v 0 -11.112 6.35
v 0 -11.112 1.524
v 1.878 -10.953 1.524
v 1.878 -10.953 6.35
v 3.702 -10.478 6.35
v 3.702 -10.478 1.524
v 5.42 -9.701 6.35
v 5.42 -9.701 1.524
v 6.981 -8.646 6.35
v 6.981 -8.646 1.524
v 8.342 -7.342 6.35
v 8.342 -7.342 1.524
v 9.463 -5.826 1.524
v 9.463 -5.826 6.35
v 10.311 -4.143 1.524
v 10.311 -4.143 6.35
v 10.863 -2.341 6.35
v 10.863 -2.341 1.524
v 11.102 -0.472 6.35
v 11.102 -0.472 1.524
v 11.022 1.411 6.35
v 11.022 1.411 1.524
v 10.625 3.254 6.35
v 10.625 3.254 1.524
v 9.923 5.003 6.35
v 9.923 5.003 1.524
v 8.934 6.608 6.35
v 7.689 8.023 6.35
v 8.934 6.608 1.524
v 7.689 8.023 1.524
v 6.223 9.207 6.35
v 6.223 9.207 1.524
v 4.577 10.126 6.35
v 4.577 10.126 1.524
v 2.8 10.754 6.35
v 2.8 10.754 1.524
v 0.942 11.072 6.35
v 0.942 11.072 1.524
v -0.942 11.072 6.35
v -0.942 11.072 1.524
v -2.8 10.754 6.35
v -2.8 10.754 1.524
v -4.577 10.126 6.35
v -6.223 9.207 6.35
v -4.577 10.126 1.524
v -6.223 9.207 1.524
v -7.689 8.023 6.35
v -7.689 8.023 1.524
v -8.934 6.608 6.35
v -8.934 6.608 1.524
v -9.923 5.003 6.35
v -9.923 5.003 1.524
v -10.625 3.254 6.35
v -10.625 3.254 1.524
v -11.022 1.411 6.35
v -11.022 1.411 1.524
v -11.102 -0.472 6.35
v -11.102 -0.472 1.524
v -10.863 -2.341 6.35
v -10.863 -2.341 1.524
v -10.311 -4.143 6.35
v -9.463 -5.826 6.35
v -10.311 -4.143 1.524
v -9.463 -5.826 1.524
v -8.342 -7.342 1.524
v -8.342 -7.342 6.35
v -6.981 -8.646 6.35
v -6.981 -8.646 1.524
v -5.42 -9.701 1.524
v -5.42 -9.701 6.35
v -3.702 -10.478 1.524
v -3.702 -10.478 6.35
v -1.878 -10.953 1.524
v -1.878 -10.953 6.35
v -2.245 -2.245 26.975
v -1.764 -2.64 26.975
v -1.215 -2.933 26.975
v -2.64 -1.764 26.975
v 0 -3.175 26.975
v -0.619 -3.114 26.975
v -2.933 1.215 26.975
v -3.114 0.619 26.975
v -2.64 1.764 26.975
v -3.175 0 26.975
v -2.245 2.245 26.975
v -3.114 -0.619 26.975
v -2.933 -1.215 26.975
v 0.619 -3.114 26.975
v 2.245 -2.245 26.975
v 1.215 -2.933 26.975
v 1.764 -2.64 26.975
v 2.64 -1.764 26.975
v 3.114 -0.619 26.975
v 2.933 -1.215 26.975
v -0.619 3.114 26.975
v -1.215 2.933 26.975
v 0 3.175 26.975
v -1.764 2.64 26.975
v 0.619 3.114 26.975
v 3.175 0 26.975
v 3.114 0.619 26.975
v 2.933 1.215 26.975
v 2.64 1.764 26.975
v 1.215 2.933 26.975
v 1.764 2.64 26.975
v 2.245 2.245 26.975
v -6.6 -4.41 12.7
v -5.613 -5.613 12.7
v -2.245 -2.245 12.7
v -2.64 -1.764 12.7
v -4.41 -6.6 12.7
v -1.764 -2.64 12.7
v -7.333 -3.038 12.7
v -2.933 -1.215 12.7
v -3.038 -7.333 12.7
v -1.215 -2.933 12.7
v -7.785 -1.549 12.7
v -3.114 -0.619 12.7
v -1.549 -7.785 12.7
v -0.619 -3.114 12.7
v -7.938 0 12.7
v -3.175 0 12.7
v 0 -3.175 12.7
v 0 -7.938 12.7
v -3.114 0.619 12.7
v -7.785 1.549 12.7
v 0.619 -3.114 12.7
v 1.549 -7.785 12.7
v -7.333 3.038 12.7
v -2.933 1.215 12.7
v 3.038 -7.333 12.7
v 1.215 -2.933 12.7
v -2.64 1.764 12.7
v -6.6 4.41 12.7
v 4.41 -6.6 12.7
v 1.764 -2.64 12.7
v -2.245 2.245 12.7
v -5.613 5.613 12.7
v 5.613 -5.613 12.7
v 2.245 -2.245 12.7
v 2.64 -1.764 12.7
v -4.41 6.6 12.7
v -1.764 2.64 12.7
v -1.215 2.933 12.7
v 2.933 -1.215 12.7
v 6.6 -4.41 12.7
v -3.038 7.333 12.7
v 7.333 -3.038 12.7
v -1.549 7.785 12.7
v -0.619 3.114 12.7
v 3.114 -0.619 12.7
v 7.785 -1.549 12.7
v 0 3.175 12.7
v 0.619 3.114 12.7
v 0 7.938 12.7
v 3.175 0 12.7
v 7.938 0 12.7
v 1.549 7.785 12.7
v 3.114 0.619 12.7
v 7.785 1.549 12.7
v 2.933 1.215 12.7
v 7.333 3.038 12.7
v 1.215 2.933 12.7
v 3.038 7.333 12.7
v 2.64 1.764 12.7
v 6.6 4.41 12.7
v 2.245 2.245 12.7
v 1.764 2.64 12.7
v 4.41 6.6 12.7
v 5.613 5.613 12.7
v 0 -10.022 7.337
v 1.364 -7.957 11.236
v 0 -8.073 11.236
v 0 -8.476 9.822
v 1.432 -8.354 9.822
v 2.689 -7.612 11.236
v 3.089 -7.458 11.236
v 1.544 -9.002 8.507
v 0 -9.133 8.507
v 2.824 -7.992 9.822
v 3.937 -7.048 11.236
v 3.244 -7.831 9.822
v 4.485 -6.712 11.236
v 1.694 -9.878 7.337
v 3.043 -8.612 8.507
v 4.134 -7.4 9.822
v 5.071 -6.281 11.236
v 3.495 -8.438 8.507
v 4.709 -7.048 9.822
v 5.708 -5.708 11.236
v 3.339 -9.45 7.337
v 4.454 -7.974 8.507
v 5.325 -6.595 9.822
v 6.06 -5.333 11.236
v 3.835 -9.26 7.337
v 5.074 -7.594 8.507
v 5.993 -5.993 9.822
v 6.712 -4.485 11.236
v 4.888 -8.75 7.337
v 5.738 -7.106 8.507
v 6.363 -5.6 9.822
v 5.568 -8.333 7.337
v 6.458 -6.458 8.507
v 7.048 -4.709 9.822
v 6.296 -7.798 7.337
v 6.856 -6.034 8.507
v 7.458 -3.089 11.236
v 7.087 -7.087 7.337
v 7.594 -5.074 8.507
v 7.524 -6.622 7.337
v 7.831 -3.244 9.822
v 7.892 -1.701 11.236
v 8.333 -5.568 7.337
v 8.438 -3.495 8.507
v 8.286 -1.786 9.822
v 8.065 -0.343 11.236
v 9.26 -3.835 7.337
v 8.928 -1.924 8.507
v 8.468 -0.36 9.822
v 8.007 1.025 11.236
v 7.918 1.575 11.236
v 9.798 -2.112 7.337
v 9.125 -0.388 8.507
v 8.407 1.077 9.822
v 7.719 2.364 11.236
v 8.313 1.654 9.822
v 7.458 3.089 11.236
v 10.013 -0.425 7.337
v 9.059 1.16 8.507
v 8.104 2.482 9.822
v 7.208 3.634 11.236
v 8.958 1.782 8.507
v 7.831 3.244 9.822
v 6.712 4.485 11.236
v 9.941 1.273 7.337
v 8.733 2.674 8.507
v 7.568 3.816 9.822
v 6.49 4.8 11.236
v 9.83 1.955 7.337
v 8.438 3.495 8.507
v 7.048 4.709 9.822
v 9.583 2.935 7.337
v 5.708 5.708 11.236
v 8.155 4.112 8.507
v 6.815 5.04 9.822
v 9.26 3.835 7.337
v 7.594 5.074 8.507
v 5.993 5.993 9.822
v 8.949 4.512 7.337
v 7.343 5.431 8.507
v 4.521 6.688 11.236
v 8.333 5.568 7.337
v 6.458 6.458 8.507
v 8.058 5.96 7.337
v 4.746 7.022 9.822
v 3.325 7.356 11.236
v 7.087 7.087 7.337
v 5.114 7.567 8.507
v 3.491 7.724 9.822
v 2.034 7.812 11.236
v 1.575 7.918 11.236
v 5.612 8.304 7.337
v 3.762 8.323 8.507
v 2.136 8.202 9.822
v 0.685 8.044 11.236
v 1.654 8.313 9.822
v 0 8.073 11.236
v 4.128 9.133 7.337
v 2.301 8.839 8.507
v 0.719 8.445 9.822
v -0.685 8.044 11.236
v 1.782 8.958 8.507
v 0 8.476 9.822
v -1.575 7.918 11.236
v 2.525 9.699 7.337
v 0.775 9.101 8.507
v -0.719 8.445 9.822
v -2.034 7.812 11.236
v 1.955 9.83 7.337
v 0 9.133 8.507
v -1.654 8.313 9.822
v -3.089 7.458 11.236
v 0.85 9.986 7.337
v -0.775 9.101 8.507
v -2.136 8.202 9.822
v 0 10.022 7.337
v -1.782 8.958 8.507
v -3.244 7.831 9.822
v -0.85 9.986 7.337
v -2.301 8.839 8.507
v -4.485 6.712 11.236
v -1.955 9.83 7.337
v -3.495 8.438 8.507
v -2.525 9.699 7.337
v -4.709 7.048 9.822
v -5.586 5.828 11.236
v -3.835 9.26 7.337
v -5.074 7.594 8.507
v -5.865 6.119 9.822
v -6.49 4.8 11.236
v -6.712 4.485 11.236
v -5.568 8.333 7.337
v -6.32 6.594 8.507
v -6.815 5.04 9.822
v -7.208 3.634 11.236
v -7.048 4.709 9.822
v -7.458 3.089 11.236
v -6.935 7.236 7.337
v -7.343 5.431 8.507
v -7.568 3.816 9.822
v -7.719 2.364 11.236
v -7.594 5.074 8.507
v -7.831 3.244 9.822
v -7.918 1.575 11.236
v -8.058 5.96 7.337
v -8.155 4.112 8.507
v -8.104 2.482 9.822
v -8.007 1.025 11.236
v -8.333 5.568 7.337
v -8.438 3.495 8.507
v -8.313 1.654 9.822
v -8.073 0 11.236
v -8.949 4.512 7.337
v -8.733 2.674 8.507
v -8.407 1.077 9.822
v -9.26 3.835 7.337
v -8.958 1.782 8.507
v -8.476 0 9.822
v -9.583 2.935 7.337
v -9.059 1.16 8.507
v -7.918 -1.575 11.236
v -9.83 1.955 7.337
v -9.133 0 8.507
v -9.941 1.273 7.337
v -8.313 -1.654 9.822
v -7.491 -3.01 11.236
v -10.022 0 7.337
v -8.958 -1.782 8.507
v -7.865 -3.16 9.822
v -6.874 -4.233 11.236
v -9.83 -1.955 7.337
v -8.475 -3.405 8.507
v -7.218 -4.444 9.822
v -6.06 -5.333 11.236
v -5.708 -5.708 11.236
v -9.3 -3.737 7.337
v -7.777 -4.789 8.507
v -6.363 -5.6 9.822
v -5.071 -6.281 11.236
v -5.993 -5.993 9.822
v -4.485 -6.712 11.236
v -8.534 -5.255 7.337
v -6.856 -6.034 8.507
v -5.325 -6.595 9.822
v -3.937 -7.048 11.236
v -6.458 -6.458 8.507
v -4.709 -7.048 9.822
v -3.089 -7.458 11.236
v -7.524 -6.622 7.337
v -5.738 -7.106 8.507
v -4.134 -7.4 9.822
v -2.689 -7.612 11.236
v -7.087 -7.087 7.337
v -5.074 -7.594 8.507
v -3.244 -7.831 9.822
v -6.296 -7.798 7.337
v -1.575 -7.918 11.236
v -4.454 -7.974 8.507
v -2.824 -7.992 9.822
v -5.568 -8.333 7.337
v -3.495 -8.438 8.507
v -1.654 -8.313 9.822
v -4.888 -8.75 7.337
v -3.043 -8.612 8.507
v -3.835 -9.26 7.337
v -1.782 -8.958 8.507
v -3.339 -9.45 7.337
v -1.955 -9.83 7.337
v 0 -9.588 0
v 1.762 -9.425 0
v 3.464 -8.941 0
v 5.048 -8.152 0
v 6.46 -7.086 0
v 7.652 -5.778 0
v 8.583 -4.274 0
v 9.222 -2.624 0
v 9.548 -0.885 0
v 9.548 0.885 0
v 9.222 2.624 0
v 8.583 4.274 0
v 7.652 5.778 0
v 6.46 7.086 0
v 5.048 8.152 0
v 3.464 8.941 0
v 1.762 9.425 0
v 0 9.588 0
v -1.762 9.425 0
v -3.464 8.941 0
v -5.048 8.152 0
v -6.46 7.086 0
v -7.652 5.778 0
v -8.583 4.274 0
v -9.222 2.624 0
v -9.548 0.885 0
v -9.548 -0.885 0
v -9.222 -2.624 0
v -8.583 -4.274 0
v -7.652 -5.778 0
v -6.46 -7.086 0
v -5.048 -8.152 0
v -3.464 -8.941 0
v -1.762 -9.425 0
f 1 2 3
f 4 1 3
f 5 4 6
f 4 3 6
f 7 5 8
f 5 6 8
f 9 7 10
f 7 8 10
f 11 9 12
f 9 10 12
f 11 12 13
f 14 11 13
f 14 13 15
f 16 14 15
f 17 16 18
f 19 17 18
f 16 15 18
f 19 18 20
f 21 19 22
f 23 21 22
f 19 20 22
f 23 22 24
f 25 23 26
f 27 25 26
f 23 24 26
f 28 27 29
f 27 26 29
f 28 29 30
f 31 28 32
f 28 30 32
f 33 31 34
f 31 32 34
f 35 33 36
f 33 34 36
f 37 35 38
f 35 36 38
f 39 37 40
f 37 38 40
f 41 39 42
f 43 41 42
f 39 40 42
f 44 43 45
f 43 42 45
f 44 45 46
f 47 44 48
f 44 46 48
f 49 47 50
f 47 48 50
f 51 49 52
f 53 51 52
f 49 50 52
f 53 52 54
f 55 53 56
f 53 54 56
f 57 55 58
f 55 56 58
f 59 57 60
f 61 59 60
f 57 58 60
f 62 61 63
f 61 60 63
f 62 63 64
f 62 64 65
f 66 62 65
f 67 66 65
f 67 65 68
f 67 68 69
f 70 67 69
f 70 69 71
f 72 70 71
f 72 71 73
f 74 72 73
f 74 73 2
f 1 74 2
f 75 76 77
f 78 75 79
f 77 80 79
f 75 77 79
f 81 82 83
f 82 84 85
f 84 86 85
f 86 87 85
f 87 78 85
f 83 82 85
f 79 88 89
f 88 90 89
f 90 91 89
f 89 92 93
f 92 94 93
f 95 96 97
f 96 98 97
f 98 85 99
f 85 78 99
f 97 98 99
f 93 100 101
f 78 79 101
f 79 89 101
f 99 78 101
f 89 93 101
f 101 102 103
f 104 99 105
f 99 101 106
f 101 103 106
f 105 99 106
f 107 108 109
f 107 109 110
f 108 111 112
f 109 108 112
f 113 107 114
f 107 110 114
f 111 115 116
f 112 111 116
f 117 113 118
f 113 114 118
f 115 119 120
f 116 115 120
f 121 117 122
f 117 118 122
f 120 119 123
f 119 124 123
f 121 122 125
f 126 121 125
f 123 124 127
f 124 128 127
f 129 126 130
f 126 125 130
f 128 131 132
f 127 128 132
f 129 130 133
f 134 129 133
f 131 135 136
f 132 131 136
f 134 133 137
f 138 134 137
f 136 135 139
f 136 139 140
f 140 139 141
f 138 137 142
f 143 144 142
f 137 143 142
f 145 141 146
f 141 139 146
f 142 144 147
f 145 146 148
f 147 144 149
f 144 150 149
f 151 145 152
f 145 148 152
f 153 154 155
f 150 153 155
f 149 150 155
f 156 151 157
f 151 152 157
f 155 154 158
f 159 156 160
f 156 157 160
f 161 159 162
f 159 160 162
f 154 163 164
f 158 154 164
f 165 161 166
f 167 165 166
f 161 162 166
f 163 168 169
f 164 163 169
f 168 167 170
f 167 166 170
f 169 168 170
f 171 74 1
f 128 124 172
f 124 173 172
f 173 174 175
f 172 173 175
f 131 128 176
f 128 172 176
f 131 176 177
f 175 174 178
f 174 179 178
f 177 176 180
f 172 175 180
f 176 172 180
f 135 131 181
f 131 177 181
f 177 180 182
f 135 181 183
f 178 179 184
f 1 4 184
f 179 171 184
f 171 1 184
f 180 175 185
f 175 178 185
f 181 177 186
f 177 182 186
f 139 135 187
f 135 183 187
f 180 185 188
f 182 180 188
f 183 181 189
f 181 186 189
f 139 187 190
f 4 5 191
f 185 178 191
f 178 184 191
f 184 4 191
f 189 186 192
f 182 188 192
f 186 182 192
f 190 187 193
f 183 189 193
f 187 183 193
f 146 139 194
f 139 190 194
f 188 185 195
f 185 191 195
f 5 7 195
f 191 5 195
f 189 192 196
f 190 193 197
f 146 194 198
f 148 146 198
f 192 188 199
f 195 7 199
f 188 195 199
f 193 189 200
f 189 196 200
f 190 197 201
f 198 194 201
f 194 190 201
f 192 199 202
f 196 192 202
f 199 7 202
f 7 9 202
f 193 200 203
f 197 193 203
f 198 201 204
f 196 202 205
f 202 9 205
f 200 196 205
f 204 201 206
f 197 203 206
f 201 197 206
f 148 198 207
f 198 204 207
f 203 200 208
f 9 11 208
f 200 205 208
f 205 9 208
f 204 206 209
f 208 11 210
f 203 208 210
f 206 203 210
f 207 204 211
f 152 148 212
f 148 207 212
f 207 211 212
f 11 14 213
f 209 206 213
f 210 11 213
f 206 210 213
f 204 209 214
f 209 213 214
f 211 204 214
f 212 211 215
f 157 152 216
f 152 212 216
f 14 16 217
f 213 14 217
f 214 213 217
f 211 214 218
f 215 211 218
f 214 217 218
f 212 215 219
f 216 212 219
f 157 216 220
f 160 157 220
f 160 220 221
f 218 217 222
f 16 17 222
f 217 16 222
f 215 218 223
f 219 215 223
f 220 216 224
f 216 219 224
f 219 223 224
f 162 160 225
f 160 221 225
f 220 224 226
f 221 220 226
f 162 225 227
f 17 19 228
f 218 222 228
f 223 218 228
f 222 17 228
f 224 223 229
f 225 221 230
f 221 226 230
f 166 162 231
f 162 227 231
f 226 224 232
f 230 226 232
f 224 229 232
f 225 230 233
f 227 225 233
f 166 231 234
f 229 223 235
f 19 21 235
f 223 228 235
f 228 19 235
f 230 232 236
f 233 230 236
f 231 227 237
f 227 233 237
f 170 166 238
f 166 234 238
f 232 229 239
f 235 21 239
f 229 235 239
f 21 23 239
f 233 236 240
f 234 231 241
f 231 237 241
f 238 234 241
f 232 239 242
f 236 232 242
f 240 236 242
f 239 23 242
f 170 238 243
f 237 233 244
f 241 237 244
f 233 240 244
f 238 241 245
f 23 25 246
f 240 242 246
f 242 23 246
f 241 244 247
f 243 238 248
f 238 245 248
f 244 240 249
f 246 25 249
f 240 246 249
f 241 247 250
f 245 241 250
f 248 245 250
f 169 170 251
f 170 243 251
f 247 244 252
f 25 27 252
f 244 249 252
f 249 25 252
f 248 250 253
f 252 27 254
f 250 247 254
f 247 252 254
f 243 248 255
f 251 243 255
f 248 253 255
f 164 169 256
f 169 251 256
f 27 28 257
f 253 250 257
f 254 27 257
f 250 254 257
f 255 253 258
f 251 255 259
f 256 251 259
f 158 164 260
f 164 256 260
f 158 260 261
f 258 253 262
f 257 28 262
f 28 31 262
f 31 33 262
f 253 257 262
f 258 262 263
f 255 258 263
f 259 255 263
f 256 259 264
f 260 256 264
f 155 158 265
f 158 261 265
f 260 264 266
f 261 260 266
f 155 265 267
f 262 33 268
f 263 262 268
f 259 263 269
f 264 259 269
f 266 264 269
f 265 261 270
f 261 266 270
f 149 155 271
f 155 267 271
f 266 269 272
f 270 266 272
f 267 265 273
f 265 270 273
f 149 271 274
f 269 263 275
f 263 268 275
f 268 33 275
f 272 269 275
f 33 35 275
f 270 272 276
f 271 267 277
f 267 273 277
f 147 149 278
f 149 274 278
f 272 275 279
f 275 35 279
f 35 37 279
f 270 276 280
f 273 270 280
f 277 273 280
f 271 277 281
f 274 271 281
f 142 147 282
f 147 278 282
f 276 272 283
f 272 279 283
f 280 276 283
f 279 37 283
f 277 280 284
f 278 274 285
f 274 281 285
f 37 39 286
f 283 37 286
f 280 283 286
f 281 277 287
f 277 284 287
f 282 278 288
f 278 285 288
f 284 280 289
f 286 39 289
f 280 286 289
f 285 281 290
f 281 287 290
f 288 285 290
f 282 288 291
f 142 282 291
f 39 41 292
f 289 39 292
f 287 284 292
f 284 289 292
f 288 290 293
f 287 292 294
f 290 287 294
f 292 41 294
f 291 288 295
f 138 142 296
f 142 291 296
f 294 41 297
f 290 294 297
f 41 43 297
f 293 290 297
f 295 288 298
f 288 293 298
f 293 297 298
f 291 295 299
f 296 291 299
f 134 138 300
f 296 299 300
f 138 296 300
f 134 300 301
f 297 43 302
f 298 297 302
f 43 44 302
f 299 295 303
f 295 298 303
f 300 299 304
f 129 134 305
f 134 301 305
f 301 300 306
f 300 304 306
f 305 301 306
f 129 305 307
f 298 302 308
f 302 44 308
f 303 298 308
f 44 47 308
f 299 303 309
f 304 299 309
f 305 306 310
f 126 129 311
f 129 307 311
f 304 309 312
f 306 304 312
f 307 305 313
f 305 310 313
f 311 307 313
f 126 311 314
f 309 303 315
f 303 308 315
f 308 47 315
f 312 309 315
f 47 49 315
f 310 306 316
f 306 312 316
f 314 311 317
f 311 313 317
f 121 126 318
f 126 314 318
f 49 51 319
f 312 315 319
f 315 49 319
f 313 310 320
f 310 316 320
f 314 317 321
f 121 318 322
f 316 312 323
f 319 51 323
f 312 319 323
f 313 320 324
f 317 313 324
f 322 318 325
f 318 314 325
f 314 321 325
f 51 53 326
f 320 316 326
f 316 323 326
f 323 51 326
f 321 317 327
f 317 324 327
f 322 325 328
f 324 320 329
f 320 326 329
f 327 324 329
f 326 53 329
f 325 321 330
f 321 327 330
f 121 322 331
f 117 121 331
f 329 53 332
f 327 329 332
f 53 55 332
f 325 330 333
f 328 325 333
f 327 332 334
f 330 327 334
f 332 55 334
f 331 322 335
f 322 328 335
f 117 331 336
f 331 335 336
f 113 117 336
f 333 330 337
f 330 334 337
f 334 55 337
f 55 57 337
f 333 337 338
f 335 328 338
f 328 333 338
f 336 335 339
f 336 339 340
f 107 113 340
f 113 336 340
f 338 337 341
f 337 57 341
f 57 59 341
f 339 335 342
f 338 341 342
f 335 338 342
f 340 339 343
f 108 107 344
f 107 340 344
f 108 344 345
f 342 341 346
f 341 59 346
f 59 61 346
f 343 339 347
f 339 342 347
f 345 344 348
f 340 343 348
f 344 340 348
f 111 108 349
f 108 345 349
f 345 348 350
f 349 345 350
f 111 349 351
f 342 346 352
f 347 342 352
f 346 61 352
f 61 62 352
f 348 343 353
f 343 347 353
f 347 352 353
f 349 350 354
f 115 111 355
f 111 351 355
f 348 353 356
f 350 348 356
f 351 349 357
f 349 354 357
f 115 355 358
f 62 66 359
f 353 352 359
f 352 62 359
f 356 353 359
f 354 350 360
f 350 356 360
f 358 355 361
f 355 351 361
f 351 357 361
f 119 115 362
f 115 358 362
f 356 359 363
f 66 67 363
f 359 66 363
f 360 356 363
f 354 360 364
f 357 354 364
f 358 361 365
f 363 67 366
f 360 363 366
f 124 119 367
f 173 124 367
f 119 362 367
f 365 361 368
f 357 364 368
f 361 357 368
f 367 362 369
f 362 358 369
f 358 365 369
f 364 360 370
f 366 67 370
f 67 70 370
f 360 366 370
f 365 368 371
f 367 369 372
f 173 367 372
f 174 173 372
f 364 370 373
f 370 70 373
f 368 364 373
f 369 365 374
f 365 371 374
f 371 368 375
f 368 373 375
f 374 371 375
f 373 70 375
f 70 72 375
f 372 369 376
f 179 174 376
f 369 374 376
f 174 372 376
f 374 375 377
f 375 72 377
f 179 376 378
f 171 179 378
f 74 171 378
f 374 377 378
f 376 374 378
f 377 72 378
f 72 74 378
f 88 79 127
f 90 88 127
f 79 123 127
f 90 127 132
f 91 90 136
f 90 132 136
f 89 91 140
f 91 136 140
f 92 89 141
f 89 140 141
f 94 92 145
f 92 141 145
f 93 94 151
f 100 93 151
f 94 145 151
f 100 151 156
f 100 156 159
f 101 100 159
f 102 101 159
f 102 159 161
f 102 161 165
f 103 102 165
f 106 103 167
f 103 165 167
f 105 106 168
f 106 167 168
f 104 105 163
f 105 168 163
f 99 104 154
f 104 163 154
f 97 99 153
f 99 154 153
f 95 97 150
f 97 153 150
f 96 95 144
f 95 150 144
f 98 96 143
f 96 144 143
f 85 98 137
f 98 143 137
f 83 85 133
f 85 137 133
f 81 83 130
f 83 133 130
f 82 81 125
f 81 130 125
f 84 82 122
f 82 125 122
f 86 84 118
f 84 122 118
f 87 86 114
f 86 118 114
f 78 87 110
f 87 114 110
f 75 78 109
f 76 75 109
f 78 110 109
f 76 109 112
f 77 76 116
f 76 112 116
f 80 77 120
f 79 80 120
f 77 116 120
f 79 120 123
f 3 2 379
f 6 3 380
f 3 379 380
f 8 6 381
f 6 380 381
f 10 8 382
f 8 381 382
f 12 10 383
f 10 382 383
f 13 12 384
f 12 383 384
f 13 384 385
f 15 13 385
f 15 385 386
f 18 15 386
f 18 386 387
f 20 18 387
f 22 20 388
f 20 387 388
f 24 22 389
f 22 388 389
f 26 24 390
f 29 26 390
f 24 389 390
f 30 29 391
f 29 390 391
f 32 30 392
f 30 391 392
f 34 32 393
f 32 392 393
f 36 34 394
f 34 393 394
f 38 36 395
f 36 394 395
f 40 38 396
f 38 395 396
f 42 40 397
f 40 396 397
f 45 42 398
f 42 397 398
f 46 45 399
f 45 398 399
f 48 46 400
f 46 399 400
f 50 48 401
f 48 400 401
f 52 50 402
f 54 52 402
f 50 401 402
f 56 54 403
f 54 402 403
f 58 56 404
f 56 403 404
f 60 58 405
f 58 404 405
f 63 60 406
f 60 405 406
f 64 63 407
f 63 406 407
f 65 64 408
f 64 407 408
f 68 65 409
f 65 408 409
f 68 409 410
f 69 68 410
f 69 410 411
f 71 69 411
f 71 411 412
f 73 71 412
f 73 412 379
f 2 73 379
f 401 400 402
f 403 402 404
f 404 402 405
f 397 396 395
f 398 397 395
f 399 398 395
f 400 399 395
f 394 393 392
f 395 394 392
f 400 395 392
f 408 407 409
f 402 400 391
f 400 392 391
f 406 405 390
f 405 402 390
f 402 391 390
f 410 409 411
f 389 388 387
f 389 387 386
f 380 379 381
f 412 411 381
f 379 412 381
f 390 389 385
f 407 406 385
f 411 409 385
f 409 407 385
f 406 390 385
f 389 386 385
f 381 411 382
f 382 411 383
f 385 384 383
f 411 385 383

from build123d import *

# Parameters (mm, degrees)
F2_SIZE2 = 1.524
F2_SIZE  = 1.524


with BuildPart() as f1:
    # F0 (on Right) → F1 (revolve)
    with BuildSketch(Plane.YZ):
        with BuildLine():
            Line((-11.1125, 6.35), (-11.1125, 0))
            Line((-11.1125, 0), (0, 0))
            Line((0, 0), (0, 26.9748))
            Line((0, 26.9748), (-3.175, 26.9748))
            Line((-3.175, 26.9748), (-3.175, 12.7))
            Line((-3.175, 12.7), (-7.9375, 12.7))
            ThreePointArc((-7.9375, 12.7), (-8.774141, 9.14957), (-11.1125, 6.35))
        make_face()
    revolve(axis=Axis((0, 0, 13.4874), (0, 0, 1)))

    # F2
    f2_edges = [f1.edges().sort_by_distance(p)[0] for p in [
        (0, 11.1125, 0),
    ]]
    chamfer(f2_edges, length=F2_SIZE, length2=F2_SIZE2)


solid = f1.part
